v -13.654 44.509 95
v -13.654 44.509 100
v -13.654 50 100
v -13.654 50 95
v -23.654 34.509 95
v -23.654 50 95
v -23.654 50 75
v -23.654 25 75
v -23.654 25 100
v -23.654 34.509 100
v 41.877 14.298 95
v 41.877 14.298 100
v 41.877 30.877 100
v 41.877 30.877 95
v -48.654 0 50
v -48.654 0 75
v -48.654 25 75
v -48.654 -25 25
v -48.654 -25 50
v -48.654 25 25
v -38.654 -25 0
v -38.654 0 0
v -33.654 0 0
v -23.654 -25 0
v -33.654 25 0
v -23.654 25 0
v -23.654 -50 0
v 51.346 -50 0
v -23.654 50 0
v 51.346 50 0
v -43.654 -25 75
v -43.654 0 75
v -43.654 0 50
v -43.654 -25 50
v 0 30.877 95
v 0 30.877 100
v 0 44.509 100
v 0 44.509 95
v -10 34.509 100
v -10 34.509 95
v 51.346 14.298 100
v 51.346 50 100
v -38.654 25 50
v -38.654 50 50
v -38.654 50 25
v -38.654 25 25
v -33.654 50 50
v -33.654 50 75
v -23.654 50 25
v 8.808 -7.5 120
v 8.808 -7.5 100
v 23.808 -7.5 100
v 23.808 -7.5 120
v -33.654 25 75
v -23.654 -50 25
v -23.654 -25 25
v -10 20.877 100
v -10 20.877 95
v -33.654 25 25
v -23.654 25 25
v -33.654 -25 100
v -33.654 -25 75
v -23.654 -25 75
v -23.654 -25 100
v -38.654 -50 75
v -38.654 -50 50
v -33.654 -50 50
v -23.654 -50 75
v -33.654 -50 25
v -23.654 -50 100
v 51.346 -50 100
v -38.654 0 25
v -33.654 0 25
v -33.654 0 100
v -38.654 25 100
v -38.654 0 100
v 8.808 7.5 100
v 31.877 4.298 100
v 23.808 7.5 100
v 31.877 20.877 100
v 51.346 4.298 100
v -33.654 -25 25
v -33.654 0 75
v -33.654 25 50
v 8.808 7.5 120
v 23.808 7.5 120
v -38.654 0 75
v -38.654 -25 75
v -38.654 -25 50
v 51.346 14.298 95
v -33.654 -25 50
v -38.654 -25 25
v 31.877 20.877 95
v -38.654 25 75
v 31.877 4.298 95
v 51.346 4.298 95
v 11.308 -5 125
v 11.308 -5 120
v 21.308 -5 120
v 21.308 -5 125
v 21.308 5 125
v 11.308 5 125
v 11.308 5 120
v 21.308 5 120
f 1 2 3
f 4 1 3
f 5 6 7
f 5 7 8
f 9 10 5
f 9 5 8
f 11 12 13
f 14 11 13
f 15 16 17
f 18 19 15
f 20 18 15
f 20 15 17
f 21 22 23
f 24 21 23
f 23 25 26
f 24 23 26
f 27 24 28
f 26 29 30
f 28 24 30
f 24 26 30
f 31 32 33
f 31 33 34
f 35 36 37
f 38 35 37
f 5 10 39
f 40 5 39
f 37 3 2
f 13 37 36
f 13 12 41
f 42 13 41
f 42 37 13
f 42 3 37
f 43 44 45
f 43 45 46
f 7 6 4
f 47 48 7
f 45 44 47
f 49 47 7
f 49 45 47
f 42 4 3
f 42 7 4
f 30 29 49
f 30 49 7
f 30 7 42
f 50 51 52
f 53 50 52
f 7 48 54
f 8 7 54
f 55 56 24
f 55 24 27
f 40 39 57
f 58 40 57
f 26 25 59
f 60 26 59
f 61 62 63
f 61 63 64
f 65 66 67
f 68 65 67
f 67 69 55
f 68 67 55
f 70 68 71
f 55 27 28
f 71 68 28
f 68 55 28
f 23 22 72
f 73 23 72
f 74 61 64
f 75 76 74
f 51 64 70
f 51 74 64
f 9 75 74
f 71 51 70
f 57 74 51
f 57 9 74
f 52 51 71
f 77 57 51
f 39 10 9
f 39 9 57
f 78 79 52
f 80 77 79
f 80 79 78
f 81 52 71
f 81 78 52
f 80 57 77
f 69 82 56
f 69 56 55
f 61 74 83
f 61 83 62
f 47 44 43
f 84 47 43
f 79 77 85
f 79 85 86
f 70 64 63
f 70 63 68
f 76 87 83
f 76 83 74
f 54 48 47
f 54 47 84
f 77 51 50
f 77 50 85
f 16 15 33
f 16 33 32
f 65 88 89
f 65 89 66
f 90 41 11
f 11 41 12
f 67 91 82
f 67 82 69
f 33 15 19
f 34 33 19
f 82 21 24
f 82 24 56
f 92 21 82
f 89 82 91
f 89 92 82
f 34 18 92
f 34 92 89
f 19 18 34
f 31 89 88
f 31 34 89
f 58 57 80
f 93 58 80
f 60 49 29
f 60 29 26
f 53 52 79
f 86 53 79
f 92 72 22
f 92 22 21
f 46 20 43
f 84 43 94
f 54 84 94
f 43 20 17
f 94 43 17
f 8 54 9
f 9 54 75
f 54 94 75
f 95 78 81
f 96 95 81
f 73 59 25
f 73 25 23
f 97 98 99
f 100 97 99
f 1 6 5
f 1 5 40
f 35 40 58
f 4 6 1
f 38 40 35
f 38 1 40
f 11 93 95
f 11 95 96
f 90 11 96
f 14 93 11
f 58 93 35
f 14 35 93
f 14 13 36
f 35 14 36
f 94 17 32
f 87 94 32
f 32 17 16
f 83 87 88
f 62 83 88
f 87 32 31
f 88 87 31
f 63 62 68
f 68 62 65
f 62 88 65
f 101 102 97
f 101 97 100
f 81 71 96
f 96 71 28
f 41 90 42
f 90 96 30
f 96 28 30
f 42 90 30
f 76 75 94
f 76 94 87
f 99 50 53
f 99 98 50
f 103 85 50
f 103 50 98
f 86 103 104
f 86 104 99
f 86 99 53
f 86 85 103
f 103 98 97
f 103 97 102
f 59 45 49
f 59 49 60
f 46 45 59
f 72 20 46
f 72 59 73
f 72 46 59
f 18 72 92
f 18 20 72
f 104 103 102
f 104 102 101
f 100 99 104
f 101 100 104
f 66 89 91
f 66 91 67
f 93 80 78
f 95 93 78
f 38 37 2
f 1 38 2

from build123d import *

# Parameters (mm, degrees)
F0_W      = 100
F0_H      = 100
F1_DEPTH  = 100
F2_W      = 25
F2_H      = 25
F3_DEPTH  = 25
F4_DEPTH  = 15
F5_DEPTH  = 10
F6_DEPTH  = 5
F8_DEPTH  = 5
F9_W      = 15
F9_H      = 15
F10_DEPTH = 20
F11_W     = 10
F11_H     = 10
F12_DEPTH = 5


with BuildPart() as f1:
    # F0 (on Top) → F1 (new body)
    with BuildSketch(Plane.XY):
        with Locations((1.3461533941, 0)):
            Rectangle(F0_W, F0_H)
    extrude(amount=F1_DEPTH)

    # F2 (on face) → F3 (cut)
    with BuildSketch(Plane(origin=(-48.6538466059, 0, 0), x_dir=(0, -1, 0), z_dir=(-1, 0, 0))):
        with Locations((-37.5, 87.5)):
            Rectangle(F2_W, F2_H)
        with Locations((-37.5, 12.5)):
            Rectangle(F2_W, F2_H)
        with Locations((37.5, 12.5)):
            Rectangle(F2_W, F2_H)
        with Locations((37.5, 87.5)):
            Rectangle(F2_W, F2_H)
    extrude(amount=-F3_DEPTH, mode=Mode.SUBTRACT)

    # F2 (on face) → F4 (cut)
    with BuildSketch(Plane(origin=(-48.6538466059, 0, 0), x_dir=(0, -1, 0), z_dir=(-1, 0, 0))):
        with Locations((-37.5, 62.5)):
            Rectangle(F2_W, F2_H)
        with Locations((37.5, 37.5)):
            Rectangle(F2_W, F2_H)
        with Locations((12.5, 87.5)):
            Rectangle(F2_W, F2_H)
        with Locations((-12.5, 12.5)):
            Rectangle(F2_W, F2_H)
    extrude(amount=-F4_DEPTH, mode=Mode.SUBTRACT)

    # F2 (on face) → F5 (cut)
    with BuildSketch(Plane(origin=(-48.6538466059, 0, 0), x_dir=(0, -1, 0), z_dir=(-1, 0, 0))):
        with Locations((-12.5, 87.5)):
            Rectangle(F2_W, F2_H)
        with Locations((12.5, 12.5)):
            Rectangle(F2_W, F2_H)
        with Locations((-37.5, 37.5)):
            Rectangle(F2_W, F2_H)
        with Locations((37.5, 62.5)):
            Rectangle(F2_W, F2_H)
    extrude(amount=-F5_DEPTH, mode=Mode.SUBTRACT)

    # F2 (on face) → F6 (cut)
    with BuildSketch(Plane(origin=(-48.6538466059, 0, 0), x_dir=(0, -1, 0), z_dir=(-1, 0, 0))):
        with Locations((12.5, 62.5)):
            Rectangle(F2_W, F2_H)
    extrude(amount=-F6_DEPTH, mode=Mode.SUBTRACT)

    # F7 (on face) → F8 (cut)
    with BuildSketch(Plane.XY.offset(100)):
        Polygon((-13.6538466059, 44.5087721944), (-13.6538466059, 50), (-23.6538466059, 50), (-23.6538466059, 34.5087721944), (-10, 34.5087721944), (-10, 20.8771936595), (31.8771933764, 20.8771936595), (31.8771933764, 4.2982455343), (51.3461533941, 4.2982455343), (51.3461533941, 14.2982455343), (41.8771933764, 14.2982455343), (41.8771933764, 30.8771936595), (0, 30.8771936595), (0, 44.5087721944), align=None)
    extrude(amount=-F8_DEPTH, mode=Mode.SUBTRACT)

    # F9 (on face) → F10 (join)
    with BuildSketch(Plane.XY.offset(100)):
        with Locations((16.3082494724, 0)):
            Rectangle(F9_W, F9_H)
    extrude(amount=F10_DEPTH)

    # F11 (on face) → F12 (join)
    with BuildSketch(Plane.XY.offset(120)):
        with Locations((16.3082494724, 0)):
            Rectangle(F11_W, F11_H)
    extrude(amount=F12_DEPTH)


solid = f1.part
